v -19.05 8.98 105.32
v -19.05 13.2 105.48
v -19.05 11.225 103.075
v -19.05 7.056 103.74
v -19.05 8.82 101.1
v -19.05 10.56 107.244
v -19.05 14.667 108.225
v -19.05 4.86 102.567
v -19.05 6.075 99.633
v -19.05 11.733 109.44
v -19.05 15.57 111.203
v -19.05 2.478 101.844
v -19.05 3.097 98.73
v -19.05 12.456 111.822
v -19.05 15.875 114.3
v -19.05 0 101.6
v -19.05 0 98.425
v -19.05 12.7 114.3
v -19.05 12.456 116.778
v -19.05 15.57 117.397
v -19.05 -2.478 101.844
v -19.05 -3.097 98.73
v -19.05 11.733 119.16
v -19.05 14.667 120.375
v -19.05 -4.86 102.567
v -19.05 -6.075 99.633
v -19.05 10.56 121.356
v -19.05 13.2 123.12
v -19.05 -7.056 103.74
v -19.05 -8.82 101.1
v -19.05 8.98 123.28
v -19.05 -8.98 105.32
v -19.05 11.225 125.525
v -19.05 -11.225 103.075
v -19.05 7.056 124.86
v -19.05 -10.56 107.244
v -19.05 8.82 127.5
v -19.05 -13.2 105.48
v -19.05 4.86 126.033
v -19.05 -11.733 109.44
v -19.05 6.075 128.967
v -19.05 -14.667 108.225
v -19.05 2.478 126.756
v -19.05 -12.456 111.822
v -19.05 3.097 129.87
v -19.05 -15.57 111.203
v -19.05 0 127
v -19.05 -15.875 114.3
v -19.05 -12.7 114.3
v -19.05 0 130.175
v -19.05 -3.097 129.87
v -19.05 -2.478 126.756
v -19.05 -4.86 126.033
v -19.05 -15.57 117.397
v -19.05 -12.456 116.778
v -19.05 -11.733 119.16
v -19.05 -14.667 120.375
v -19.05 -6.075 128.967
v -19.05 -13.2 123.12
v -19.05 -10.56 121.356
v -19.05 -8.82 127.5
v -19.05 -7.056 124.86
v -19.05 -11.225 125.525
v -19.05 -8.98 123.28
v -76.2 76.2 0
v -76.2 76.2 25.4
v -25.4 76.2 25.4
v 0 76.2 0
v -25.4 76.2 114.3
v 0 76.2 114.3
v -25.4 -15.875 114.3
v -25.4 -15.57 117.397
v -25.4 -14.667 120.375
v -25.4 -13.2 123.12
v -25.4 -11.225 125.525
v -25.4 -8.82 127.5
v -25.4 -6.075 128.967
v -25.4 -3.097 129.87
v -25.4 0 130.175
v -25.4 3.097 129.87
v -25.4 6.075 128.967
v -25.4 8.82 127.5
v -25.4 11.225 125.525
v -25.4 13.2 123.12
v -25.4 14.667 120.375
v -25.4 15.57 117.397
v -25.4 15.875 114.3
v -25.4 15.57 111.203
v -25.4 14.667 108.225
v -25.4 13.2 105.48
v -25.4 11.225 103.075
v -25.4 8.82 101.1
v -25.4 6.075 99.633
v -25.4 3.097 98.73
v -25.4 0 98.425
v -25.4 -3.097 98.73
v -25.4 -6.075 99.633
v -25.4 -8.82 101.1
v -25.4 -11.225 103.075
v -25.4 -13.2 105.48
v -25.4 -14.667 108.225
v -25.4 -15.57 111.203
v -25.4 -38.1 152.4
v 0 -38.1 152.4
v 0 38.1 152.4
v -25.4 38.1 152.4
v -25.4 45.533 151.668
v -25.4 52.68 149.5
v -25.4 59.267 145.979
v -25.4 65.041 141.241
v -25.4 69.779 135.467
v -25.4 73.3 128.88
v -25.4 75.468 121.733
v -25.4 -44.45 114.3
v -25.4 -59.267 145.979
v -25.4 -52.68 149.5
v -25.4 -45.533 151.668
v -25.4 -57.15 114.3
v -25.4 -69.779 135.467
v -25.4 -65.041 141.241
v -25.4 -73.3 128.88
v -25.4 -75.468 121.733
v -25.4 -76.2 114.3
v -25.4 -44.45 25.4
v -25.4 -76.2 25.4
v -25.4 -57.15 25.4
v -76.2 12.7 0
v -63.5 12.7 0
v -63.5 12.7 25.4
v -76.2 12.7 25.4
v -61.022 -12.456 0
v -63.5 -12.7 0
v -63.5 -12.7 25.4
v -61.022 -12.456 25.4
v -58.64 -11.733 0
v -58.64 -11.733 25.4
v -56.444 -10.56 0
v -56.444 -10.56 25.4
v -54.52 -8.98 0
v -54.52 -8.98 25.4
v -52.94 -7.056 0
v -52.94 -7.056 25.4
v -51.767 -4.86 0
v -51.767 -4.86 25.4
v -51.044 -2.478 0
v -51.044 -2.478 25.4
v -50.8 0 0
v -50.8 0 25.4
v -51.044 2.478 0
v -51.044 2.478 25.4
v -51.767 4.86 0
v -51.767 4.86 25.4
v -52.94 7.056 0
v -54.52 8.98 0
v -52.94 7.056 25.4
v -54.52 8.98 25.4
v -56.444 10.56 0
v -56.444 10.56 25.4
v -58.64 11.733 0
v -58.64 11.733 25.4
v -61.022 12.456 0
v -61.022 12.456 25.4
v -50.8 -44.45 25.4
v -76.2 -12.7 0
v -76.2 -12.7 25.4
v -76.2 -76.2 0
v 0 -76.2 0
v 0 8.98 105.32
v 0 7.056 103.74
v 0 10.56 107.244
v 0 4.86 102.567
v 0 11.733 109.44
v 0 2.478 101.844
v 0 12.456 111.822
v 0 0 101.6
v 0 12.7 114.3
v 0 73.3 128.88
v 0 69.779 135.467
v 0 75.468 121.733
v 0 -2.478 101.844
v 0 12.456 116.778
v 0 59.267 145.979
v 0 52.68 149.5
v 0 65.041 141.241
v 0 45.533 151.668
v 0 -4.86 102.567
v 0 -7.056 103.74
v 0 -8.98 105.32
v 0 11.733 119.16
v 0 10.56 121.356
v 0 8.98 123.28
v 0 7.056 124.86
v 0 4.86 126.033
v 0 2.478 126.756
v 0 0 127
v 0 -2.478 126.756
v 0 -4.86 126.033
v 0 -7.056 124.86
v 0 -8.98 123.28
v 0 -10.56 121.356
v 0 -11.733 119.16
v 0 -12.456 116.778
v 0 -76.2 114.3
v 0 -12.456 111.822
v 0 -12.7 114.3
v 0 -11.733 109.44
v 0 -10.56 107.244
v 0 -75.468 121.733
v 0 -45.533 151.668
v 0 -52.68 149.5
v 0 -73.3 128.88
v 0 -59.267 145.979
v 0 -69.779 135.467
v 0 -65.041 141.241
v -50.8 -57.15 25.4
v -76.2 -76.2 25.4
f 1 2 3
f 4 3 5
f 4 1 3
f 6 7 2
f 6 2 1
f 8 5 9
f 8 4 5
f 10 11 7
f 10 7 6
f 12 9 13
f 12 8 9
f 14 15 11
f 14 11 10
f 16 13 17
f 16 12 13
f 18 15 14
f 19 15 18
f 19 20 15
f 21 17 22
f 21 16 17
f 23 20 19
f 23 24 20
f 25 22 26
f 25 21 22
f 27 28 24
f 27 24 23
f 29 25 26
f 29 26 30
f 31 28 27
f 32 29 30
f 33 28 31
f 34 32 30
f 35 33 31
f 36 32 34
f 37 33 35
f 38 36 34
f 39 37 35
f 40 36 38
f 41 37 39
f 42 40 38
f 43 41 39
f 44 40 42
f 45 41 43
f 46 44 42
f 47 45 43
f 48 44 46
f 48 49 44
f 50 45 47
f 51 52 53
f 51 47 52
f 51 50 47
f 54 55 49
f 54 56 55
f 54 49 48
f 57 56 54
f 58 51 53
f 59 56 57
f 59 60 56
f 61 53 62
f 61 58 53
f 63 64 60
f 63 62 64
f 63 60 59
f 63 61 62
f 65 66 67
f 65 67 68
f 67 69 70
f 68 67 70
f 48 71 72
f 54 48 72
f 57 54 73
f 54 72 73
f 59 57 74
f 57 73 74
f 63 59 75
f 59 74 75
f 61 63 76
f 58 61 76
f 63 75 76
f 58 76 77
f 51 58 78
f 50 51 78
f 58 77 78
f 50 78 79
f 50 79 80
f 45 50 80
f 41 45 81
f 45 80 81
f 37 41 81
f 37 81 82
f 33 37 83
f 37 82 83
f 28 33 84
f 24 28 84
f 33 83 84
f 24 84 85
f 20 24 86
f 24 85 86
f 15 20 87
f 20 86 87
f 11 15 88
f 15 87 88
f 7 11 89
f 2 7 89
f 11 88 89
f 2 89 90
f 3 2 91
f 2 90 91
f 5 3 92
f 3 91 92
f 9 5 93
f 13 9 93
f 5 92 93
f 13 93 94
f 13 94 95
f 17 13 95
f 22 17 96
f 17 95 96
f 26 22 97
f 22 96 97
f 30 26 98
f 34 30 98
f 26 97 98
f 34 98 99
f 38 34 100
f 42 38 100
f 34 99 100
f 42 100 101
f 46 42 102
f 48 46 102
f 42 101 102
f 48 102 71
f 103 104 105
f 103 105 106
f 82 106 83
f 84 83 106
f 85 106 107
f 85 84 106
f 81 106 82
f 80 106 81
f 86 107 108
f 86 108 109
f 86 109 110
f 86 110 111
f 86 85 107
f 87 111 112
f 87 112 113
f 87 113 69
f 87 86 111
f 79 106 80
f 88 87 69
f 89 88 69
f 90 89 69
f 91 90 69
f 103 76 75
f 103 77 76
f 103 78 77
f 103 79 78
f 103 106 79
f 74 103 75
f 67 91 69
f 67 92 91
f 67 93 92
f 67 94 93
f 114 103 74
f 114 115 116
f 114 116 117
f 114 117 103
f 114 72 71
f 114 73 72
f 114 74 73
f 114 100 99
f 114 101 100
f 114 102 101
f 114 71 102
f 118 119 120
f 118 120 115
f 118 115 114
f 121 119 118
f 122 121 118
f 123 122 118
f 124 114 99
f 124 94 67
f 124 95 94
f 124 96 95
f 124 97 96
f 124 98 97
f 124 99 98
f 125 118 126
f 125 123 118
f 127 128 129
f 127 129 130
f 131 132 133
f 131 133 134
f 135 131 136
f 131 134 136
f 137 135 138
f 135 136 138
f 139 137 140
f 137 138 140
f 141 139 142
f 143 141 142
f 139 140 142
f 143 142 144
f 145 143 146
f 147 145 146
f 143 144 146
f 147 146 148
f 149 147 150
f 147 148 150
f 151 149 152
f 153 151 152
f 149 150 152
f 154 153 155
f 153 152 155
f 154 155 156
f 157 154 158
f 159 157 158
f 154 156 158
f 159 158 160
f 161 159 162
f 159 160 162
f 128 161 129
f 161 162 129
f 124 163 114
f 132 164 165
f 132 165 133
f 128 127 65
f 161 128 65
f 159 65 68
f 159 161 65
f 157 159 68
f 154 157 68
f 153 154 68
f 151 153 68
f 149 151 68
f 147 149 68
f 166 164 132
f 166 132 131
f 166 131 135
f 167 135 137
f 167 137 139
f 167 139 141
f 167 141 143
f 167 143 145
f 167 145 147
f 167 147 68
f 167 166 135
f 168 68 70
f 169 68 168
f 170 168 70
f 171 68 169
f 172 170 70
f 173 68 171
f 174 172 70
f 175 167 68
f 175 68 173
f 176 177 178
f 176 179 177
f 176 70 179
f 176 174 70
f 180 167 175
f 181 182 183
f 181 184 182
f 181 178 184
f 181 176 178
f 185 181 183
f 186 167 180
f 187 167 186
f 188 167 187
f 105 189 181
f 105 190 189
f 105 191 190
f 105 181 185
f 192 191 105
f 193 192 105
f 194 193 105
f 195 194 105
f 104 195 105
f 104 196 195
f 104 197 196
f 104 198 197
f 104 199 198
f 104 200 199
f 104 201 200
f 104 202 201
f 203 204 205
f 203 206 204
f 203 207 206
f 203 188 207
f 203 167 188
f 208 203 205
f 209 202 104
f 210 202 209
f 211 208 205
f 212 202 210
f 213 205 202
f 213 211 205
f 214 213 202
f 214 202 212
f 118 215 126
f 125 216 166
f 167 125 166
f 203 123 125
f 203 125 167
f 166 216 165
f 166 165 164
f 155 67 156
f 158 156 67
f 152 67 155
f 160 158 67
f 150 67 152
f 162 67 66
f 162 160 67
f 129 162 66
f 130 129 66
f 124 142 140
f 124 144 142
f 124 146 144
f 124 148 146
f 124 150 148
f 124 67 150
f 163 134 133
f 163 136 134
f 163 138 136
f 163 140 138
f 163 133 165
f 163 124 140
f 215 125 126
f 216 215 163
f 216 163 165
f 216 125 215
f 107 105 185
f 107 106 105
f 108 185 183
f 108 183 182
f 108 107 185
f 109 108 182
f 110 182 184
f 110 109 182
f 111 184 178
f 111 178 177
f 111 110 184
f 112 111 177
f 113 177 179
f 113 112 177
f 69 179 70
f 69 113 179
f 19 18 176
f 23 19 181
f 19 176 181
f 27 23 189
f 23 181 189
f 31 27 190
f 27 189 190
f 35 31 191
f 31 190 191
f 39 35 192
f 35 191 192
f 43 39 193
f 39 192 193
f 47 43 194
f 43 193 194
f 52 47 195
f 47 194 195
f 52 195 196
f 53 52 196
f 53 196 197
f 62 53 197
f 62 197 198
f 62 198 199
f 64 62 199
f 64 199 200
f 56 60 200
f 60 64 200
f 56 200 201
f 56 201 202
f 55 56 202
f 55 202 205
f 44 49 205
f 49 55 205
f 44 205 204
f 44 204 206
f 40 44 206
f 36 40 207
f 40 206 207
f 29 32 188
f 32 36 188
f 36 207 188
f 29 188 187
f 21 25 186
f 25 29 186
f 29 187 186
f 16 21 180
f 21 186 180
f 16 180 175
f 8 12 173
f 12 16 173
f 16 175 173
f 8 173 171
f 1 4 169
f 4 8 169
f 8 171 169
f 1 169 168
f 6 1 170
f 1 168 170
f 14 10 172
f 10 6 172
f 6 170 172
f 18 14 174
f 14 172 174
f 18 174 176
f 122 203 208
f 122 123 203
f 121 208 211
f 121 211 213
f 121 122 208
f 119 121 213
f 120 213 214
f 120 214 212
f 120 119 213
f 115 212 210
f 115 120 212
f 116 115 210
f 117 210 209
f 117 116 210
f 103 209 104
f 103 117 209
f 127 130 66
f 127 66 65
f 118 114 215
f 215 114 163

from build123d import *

# Parameters (mm, degrees)
F1_DEPTH  = 76.2
F2_R      = 12.7
F3_DEPTH  = 76.201
F5_DEPTH  = 25.401
F6_R      = 38.1
F7_R      = 38.1
F8_R      = 15.875
F8_R_2    = 12.7
F9_DEPTH  = 6.35
F12_DEPTH = 12.7


with BuildPart() as f1:
    # F0 (on Front) → F1 (new body, symmetric)
    with BuildSketch(Plane.XZ):
        Polygon((-76.2, 0), (0, 0), (0, 152.4), (-25.4, 152.4), (-25.4, 25.4), (-76.2, 25.4), align=None)
    extrude(amount=F1_DEPTH, both=True)

    # F2 (on face) → F3 (cut, through all)
    with BuildSketch(Plane.YZ):
        with Locations((0, 114.3)):
            Circle(F2_R)
    extrude(amount=-F3_DEPTH, mode=Mode.SUBTRACT)

    # F4 (on face) → F5 (cut, through all)
    with BuildSketch(Plane.XY.offset(25.4)):
        with BuildLine():
            Line((-76.2, 12.7), (-76.2, 0))
            Line((-76.2, 0), (-76.2, -12.7))
            Line((-76.2, -12.7), (-63.5, -12.7))
            ThreePointArc((-63.5, -12.7), (-50.8, 0), (-63.5, 12.7))
            Line((-63.5, 12.7), (-76.2, 12.7))
        make_face()
    extrude(amount=-F5_DEPTH, mode=Mode.SUBTRACT)

    # F6
    f6_edges = [f1.edges().sort_by_distance(p)[0] for p in [
        (-12.7, -76.2, 152.4),
    ]]
    fillet(f6_edges, radius=F6_R)

    # F7
    f7_edges = [f1.edges().sort_by_distance(p)[0] for p in [
        (-12.7, 76.2, 152.4),
    ]]
    fillet(f7_edges, radius=F7_R)

    # F8 (on face) → F9 (cut)
    with BuildSketch(Plane(origin=(-25.4, 0, 0), x_dir=(0, -1, 0), z_dir=(-1, 0, 0))):
        with Locations((0, 114.3)):
            Circle(F8_R)
        with Locations((0, 114.3)):
            Circle(F8_R_2, mode=Mode.SUBTRACT)
    extrude(amount=-F9_DEPTH, mode=Mode.SUBTRACT)

    # F11 (on offset) → F12 (join)
    with BuildSketch(Plane.XZ.offset(44.45)):
        Polygon((-50.8, 25.4), (-25.4, 25.4), (-25.4, 114.3), align=None)
    extrude(amount=F12_DEPTH)


solid = f1.part
